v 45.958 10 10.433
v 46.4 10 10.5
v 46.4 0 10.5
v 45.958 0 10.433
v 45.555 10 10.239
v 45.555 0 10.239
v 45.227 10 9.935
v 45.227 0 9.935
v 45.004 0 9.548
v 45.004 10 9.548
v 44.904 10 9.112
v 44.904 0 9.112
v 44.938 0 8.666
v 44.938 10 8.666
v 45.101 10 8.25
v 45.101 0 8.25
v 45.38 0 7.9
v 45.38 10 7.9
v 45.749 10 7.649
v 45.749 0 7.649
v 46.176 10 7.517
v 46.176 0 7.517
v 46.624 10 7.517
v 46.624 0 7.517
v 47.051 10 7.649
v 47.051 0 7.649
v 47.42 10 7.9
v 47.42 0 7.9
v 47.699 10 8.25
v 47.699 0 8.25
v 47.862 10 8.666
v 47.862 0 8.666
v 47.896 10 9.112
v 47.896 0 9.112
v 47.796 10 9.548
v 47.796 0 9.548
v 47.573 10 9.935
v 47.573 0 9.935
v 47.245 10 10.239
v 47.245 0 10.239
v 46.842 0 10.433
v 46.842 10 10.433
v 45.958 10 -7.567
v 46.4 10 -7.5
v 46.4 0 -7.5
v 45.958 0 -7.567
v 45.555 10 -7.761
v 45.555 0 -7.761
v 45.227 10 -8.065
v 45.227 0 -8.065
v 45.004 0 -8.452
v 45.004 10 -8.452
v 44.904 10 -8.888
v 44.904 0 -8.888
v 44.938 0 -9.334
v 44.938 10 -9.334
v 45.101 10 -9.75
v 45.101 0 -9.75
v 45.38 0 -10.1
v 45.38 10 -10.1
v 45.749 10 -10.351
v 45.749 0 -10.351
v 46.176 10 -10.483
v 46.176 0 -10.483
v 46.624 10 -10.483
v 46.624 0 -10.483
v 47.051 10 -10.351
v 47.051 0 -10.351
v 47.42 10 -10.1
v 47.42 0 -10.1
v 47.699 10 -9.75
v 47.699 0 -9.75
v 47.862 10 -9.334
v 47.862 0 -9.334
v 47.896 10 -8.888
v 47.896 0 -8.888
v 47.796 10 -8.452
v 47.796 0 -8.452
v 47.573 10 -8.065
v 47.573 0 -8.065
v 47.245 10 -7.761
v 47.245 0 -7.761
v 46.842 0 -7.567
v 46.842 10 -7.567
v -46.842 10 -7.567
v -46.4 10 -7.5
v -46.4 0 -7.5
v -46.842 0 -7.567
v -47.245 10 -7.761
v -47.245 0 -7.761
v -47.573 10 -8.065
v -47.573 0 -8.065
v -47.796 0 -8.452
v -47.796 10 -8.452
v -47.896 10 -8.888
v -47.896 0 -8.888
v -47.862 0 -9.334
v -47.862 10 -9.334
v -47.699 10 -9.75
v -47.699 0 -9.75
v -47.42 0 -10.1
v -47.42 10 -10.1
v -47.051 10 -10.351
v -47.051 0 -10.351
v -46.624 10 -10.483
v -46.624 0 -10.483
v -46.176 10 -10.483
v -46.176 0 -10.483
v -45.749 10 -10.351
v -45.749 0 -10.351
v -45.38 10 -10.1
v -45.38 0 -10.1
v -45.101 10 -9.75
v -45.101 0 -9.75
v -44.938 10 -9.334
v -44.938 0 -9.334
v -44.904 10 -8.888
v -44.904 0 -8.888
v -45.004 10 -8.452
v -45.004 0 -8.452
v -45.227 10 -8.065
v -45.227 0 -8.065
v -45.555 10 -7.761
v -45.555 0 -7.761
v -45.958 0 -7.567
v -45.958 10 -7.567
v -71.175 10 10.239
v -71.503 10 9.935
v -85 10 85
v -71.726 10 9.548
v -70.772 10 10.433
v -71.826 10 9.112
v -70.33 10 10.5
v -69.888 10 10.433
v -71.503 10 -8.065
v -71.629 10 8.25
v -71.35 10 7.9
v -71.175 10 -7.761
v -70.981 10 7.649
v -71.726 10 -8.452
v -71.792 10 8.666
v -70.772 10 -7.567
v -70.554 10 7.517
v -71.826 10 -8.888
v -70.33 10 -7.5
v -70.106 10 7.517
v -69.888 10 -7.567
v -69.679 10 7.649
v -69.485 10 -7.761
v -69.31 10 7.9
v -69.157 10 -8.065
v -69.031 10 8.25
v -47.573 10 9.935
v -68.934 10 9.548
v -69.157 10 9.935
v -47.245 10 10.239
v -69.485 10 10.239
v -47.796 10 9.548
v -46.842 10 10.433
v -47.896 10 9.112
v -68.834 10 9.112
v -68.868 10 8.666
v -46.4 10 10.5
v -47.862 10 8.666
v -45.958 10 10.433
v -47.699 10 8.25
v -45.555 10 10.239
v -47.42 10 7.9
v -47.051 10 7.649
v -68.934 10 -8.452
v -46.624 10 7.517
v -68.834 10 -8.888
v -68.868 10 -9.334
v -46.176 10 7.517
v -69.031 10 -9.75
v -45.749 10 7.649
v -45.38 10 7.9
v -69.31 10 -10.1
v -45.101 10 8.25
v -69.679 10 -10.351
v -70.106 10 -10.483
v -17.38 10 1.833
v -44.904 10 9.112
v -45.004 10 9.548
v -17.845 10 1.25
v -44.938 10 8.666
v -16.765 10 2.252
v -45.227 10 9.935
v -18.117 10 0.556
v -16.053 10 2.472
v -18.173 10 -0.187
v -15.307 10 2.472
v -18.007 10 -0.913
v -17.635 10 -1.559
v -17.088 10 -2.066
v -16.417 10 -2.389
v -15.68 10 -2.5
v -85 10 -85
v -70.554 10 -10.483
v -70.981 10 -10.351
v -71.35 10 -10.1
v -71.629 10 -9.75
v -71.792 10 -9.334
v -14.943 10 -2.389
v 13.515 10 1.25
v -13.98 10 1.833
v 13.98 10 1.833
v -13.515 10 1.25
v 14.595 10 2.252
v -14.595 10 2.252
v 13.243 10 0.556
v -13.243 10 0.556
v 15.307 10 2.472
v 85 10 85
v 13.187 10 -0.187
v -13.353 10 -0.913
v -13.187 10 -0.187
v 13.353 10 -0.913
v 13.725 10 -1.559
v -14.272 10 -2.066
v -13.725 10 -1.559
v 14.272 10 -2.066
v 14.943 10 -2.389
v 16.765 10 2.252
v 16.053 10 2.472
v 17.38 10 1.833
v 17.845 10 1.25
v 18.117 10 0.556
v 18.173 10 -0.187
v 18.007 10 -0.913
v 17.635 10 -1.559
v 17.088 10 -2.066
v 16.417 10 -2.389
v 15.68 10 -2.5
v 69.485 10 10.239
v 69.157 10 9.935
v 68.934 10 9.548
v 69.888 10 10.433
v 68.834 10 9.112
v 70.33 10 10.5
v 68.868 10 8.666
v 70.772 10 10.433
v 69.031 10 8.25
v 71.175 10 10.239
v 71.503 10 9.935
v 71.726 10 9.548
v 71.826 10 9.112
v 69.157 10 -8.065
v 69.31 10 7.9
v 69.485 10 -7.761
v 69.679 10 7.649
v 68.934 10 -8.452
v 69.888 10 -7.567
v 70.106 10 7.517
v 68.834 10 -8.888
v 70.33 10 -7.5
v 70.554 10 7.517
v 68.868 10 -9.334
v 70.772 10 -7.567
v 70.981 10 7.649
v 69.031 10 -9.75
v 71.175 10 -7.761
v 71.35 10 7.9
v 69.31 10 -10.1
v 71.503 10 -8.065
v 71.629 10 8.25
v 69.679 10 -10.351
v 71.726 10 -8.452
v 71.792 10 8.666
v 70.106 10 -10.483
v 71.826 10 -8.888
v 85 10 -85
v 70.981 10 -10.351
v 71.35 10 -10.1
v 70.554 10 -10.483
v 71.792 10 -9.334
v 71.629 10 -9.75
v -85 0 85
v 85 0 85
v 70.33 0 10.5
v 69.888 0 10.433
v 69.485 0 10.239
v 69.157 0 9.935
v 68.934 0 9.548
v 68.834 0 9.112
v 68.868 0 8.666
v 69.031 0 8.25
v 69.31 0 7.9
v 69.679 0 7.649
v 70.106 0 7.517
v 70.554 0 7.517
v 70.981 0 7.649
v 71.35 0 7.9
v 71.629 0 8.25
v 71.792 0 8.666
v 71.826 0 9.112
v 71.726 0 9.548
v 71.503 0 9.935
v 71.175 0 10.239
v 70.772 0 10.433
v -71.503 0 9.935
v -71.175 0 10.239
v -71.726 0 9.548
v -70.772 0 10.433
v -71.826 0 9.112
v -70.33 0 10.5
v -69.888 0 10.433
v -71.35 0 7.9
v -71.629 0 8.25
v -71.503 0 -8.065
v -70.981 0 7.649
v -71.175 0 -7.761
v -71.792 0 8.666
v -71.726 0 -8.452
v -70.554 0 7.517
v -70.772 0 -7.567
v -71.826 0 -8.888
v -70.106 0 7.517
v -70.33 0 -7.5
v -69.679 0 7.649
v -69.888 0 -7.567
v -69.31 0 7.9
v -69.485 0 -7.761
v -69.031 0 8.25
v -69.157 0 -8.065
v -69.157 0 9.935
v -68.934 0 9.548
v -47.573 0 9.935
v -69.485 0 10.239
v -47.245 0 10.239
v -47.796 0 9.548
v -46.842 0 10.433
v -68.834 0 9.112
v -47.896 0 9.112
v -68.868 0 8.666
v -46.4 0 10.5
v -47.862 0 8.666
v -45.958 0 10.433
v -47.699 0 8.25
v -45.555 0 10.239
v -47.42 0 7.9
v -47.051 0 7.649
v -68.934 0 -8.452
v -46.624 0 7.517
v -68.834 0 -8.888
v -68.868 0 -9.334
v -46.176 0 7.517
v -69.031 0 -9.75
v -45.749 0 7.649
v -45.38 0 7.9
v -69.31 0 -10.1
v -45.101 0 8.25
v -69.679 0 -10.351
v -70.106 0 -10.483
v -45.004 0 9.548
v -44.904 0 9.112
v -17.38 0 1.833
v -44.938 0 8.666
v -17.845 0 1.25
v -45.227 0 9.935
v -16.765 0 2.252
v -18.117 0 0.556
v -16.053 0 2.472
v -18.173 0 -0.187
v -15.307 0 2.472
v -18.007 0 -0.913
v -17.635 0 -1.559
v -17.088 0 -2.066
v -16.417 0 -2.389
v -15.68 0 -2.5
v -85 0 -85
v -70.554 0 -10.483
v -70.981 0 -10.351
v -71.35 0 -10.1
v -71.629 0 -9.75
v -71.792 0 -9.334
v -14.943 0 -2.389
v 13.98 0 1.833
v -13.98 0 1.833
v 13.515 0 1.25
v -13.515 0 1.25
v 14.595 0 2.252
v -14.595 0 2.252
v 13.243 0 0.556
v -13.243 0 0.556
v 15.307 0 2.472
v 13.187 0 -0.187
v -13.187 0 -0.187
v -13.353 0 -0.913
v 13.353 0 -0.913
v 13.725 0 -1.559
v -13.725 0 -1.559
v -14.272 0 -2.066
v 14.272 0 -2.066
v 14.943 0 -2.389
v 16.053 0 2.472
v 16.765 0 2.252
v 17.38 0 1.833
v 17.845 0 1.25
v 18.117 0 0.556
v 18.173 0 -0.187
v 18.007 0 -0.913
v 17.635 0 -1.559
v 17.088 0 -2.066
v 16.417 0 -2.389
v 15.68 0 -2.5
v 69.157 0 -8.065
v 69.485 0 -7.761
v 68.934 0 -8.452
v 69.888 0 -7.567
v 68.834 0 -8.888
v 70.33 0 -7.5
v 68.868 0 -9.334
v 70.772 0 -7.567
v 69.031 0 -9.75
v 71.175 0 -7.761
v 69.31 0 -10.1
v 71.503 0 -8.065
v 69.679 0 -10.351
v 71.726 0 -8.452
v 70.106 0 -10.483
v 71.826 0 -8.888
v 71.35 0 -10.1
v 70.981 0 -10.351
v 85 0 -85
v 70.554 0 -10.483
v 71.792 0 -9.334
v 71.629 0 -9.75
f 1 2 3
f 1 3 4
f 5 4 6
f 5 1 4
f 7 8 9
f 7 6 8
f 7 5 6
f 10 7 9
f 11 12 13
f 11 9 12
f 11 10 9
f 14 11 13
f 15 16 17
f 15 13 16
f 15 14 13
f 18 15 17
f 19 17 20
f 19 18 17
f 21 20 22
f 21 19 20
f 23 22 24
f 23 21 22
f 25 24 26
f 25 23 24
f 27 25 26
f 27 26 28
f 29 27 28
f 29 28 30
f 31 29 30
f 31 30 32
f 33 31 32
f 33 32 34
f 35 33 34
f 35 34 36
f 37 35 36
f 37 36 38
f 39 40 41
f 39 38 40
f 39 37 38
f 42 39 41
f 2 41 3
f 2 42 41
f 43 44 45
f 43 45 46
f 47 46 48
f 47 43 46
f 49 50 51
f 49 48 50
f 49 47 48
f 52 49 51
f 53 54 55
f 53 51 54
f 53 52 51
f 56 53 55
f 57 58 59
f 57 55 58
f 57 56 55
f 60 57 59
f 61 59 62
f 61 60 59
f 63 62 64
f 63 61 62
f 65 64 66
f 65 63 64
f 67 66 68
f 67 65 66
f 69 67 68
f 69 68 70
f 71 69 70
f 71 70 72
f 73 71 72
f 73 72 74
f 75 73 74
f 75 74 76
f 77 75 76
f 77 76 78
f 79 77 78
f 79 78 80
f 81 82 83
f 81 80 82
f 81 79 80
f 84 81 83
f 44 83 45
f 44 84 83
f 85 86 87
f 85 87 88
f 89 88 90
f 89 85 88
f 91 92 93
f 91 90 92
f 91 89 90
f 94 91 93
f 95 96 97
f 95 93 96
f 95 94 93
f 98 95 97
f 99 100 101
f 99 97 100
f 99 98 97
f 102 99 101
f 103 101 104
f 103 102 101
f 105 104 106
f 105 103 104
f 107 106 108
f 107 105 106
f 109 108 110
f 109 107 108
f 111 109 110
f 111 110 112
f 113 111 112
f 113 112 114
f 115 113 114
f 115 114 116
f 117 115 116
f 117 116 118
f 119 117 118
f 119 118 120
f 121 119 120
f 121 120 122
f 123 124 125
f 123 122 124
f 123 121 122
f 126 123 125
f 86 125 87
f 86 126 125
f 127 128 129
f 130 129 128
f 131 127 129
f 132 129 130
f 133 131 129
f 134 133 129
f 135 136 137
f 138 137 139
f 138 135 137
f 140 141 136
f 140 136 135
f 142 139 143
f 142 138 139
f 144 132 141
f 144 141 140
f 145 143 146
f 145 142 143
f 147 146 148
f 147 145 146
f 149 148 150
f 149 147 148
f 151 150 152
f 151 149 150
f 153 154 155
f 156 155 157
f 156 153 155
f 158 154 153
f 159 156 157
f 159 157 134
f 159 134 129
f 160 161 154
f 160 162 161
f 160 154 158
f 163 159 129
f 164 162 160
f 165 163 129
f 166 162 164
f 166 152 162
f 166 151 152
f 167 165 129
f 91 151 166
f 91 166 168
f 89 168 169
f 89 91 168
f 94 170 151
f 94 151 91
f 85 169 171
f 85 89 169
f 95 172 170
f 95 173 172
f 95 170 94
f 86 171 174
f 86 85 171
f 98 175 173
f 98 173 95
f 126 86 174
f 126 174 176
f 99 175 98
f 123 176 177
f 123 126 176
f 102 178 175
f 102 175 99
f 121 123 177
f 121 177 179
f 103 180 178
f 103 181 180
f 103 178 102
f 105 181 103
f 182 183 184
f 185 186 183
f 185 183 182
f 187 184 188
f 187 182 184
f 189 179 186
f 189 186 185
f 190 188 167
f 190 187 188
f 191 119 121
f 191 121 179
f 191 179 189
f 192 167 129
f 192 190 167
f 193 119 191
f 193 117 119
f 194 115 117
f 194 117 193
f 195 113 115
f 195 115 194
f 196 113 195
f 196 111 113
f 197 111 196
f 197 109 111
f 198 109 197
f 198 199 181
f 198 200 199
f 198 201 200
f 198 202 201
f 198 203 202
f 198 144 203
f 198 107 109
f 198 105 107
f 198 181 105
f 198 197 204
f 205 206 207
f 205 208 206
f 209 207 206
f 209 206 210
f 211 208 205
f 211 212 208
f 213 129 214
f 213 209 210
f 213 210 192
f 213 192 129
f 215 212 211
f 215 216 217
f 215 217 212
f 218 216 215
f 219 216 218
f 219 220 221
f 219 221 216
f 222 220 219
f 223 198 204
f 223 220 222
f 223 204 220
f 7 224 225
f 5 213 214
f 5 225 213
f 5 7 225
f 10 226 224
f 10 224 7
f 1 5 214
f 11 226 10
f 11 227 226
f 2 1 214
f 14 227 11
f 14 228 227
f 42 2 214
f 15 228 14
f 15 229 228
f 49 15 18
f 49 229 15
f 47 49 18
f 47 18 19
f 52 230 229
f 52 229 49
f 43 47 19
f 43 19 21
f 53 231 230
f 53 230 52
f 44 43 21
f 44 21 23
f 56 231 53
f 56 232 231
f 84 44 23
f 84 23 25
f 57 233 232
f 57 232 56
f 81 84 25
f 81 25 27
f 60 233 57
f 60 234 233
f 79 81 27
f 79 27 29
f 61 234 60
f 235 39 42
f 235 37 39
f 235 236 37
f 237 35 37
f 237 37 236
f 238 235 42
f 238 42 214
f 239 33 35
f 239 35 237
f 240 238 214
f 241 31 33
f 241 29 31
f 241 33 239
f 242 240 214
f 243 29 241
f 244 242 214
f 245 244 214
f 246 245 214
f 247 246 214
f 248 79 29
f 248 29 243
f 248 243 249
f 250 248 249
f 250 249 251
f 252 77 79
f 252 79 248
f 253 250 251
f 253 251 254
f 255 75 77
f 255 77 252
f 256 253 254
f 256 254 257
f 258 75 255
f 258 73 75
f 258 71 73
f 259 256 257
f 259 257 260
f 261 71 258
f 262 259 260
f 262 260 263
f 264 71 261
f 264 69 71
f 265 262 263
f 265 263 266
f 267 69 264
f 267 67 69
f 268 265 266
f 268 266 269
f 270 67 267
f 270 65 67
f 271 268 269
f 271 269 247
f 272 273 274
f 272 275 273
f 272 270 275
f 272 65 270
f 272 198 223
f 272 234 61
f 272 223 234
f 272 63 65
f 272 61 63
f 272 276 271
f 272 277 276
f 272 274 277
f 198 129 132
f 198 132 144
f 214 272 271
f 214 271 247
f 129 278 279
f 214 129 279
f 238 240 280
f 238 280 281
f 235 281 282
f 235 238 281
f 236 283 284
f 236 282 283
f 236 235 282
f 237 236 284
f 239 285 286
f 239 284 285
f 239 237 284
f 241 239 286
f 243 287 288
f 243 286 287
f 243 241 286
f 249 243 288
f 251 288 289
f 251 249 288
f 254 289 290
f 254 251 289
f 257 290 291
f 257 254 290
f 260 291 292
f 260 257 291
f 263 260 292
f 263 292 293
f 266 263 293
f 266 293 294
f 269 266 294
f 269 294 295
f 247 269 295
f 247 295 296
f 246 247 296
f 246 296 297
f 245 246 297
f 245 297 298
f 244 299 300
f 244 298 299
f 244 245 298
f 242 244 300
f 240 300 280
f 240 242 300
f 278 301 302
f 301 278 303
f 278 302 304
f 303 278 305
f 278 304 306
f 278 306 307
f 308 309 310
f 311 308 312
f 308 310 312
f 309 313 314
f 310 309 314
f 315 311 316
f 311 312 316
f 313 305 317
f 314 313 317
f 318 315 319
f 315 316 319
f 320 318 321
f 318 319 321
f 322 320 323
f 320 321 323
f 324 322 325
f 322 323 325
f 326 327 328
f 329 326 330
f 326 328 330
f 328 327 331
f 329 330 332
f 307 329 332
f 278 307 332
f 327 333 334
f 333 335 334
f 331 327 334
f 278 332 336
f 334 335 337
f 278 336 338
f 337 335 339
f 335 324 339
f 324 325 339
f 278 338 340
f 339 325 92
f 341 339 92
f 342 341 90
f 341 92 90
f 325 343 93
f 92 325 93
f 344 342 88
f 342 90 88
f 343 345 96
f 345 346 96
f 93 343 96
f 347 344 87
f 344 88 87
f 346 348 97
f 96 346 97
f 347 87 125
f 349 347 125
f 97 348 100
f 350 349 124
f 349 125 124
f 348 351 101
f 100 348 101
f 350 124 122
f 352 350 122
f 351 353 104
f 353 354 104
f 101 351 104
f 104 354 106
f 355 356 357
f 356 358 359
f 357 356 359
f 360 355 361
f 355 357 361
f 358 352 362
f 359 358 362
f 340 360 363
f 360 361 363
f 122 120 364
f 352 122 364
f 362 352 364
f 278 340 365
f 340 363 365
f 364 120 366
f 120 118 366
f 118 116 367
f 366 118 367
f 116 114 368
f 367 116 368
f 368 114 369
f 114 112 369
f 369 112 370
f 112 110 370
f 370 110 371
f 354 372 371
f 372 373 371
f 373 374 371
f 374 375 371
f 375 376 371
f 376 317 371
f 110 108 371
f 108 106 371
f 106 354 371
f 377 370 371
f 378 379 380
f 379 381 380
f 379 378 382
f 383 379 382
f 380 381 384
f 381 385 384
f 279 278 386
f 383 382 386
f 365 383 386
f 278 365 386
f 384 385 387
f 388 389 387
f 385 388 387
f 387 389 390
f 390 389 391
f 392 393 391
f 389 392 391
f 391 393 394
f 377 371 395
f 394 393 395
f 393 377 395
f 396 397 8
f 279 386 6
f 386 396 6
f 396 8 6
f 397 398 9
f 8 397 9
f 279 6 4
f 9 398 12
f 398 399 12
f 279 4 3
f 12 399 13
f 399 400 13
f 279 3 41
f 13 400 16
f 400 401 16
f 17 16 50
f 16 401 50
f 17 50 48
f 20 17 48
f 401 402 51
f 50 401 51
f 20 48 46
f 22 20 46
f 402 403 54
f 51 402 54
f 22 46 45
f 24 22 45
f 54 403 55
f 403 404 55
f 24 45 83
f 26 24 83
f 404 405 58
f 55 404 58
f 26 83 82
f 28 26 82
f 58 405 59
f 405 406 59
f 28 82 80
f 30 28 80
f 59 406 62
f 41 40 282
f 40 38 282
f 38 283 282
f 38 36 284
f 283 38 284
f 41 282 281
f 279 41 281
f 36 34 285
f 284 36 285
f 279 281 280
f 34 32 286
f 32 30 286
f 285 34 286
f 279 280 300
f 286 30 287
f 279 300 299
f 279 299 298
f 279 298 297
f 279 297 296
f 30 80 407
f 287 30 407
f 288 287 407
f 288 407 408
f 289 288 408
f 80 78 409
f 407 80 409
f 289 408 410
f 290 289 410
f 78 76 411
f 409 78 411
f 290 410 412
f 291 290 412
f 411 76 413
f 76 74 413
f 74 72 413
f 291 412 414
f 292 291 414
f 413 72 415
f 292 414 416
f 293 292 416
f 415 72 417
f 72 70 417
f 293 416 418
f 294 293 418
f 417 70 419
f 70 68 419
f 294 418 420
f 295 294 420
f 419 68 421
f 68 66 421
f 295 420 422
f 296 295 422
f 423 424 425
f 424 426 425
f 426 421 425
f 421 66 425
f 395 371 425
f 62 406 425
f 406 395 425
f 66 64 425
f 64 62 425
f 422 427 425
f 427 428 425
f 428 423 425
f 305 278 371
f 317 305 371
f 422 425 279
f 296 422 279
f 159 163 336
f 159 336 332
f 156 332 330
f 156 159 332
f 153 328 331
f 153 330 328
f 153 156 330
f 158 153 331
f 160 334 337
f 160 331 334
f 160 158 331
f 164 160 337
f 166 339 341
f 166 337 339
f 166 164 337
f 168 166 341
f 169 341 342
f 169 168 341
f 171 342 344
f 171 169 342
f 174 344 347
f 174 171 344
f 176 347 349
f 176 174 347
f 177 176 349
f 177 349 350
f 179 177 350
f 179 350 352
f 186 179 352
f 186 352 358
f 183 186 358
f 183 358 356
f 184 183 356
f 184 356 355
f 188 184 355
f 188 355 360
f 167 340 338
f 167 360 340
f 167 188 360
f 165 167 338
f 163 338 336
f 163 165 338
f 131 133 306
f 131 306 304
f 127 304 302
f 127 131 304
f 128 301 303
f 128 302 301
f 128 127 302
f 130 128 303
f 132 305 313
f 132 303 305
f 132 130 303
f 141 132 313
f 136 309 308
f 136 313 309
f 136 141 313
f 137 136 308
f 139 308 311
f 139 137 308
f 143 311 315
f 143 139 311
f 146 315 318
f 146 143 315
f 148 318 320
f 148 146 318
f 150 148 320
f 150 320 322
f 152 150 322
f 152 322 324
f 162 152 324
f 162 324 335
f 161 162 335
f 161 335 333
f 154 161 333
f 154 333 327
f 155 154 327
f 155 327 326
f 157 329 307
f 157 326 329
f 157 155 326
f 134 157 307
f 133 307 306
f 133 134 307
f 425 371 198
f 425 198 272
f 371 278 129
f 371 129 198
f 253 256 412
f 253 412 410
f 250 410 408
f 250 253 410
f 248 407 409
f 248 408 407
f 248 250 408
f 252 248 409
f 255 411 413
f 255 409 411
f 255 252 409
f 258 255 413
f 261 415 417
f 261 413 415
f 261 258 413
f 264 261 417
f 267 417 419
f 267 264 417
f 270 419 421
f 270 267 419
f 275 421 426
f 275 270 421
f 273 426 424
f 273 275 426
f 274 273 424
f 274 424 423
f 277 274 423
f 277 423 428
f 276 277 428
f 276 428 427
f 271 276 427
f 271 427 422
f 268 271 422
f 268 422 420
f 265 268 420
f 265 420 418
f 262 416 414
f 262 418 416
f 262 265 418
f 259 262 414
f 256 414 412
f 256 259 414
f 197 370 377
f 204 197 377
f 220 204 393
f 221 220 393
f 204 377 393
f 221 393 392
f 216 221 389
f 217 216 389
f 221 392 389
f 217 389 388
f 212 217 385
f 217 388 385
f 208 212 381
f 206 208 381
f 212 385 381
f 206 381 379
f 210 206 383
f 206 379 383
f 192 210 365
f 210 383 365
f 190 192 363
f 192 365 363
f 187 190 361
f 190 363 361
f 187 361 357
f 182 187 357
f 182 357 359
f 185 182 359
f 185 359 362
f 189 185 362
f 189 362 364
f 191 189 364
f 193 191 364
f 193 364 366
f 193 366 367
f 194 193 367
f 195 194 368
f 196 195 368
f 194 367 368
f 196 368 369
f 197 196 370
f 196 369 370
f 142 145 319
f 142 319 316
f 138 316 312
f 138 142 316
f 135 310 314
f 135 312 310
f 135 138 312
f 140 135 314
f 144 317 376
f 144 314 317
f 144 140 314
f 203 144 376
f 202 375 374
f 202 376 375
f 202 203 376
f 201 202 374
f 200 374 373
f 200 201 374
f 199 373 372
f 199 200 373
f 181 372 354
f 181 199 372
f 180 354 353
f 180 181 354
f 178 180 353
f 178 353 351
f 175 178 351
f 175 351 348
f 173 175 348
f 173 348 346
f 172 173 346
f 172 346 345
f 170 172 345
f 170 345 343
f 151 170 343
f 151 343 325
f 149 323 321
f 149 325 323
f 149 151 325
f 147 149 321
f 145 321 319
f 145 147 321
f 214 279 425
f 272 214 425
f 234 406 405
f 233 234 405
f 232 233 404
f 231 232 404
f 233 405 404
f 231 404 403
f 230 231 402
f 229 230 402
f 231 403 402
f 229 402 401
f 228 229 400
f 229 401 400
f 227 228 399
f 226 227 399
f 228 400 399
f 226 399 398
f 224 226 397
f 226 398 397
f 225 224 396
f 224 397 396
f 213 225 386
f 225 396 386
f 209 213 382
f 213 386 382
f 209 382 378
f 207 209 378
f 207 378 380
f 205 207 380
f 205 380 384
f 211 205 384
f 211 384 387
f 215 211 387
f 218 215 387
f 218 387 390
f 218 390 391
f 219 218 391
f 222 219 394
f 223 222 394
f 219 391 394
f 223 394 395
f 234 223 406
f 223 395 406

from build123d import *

# Parameters (mm, degrees)
SKETCH2_W               = 170
SKETCH2_H               = 170
BOSS_EXTRUDE1_DEPTH     = 10
CUT_EXTRUDE2_DEPTH      = 121.623380818
CUT_EXTRUDE2_DEPTH_BACK = 121.623380818
SKETCH4_R               = 1.5
SKETCH6_R               = 2.5
CUT_EXTRUDE6_DEPTH      = 10


with BuildPart() as part:
    # Sketch2 → Boss-Extrude1 (new body)
    with BuildSketch(Plane(origin=(0, 0, 0), x_dir=(1, 0, 0), z_dir=(0, 1, 0))):
        Rectangle(SKETCH2_W, SKETCH2_H)
    extrude(amount=BOSS_EXTRUDE1_DEPTH)

    # Sketch4 → Cut-Extrude2 (cut, two sides: drawn at the far end of the back side and taken through both)
    with BuildSketch(Plane(origin=(0, 0, 0), x_dir=(-1, 0, 0), z_dir=(0, -1, 0)).offset(-CUT_EXTRUDE2_DEPTH_BACK)):
        with Locations(Location((-70.33, -9, 0), (0, 0, 270))):
            Circle(SKETCH4_R)
        with Locations(Location((-70.33, 9, 0), (0, 0, 270))):
            Circle(SKETCH4_R)
        with Locations(Location((70.33, 9, 0), (0, 0, 270))):
            Circle(SKETCH4_R)
        with Locations(Location((70.33, -9, 0), (0, 0, 270))):
            Circle(SKETCH4_R)
        with Locations(Location((46.4, 9, 0), (0, 0, 270))):
            Circle(SKETCH4_R)
        with Locations(Location((46.4, -9, 0), (0, 0, 270))):
            Circle(SKETCH4_R)
        with Locations(Location((-46.4, -9, 0), (0, 0, 270))):
            Circle(SKETCH4_R)
        with Locations(Location((-46.4, 9, 0), (0, 0, 270))):
            Circle(SKETCH4_R)
    extrude(amount=CUT_EXTRUDE2_DEPTH + CUT_EXTRUDE2_DEPTH_BACK, mode=Mode.SUBTRACT)

    # Sketch6 → Cut-Extrude6 (cut)
    with BuildSketch(Plane.XZ):
        with Locations(Location((-15.68, 0, 0), (0, 0, 270))):
            Circle(SKETCH6_R)
        with Locations(Location((15.68, 0, 0), (0, 0, 270))):
            Circle(SKETCH6_R)
    extrude(amount=-CUT_EXTRUDE6_DEPTH, mode=Mode.SUBTRACT)


solid = part.part
